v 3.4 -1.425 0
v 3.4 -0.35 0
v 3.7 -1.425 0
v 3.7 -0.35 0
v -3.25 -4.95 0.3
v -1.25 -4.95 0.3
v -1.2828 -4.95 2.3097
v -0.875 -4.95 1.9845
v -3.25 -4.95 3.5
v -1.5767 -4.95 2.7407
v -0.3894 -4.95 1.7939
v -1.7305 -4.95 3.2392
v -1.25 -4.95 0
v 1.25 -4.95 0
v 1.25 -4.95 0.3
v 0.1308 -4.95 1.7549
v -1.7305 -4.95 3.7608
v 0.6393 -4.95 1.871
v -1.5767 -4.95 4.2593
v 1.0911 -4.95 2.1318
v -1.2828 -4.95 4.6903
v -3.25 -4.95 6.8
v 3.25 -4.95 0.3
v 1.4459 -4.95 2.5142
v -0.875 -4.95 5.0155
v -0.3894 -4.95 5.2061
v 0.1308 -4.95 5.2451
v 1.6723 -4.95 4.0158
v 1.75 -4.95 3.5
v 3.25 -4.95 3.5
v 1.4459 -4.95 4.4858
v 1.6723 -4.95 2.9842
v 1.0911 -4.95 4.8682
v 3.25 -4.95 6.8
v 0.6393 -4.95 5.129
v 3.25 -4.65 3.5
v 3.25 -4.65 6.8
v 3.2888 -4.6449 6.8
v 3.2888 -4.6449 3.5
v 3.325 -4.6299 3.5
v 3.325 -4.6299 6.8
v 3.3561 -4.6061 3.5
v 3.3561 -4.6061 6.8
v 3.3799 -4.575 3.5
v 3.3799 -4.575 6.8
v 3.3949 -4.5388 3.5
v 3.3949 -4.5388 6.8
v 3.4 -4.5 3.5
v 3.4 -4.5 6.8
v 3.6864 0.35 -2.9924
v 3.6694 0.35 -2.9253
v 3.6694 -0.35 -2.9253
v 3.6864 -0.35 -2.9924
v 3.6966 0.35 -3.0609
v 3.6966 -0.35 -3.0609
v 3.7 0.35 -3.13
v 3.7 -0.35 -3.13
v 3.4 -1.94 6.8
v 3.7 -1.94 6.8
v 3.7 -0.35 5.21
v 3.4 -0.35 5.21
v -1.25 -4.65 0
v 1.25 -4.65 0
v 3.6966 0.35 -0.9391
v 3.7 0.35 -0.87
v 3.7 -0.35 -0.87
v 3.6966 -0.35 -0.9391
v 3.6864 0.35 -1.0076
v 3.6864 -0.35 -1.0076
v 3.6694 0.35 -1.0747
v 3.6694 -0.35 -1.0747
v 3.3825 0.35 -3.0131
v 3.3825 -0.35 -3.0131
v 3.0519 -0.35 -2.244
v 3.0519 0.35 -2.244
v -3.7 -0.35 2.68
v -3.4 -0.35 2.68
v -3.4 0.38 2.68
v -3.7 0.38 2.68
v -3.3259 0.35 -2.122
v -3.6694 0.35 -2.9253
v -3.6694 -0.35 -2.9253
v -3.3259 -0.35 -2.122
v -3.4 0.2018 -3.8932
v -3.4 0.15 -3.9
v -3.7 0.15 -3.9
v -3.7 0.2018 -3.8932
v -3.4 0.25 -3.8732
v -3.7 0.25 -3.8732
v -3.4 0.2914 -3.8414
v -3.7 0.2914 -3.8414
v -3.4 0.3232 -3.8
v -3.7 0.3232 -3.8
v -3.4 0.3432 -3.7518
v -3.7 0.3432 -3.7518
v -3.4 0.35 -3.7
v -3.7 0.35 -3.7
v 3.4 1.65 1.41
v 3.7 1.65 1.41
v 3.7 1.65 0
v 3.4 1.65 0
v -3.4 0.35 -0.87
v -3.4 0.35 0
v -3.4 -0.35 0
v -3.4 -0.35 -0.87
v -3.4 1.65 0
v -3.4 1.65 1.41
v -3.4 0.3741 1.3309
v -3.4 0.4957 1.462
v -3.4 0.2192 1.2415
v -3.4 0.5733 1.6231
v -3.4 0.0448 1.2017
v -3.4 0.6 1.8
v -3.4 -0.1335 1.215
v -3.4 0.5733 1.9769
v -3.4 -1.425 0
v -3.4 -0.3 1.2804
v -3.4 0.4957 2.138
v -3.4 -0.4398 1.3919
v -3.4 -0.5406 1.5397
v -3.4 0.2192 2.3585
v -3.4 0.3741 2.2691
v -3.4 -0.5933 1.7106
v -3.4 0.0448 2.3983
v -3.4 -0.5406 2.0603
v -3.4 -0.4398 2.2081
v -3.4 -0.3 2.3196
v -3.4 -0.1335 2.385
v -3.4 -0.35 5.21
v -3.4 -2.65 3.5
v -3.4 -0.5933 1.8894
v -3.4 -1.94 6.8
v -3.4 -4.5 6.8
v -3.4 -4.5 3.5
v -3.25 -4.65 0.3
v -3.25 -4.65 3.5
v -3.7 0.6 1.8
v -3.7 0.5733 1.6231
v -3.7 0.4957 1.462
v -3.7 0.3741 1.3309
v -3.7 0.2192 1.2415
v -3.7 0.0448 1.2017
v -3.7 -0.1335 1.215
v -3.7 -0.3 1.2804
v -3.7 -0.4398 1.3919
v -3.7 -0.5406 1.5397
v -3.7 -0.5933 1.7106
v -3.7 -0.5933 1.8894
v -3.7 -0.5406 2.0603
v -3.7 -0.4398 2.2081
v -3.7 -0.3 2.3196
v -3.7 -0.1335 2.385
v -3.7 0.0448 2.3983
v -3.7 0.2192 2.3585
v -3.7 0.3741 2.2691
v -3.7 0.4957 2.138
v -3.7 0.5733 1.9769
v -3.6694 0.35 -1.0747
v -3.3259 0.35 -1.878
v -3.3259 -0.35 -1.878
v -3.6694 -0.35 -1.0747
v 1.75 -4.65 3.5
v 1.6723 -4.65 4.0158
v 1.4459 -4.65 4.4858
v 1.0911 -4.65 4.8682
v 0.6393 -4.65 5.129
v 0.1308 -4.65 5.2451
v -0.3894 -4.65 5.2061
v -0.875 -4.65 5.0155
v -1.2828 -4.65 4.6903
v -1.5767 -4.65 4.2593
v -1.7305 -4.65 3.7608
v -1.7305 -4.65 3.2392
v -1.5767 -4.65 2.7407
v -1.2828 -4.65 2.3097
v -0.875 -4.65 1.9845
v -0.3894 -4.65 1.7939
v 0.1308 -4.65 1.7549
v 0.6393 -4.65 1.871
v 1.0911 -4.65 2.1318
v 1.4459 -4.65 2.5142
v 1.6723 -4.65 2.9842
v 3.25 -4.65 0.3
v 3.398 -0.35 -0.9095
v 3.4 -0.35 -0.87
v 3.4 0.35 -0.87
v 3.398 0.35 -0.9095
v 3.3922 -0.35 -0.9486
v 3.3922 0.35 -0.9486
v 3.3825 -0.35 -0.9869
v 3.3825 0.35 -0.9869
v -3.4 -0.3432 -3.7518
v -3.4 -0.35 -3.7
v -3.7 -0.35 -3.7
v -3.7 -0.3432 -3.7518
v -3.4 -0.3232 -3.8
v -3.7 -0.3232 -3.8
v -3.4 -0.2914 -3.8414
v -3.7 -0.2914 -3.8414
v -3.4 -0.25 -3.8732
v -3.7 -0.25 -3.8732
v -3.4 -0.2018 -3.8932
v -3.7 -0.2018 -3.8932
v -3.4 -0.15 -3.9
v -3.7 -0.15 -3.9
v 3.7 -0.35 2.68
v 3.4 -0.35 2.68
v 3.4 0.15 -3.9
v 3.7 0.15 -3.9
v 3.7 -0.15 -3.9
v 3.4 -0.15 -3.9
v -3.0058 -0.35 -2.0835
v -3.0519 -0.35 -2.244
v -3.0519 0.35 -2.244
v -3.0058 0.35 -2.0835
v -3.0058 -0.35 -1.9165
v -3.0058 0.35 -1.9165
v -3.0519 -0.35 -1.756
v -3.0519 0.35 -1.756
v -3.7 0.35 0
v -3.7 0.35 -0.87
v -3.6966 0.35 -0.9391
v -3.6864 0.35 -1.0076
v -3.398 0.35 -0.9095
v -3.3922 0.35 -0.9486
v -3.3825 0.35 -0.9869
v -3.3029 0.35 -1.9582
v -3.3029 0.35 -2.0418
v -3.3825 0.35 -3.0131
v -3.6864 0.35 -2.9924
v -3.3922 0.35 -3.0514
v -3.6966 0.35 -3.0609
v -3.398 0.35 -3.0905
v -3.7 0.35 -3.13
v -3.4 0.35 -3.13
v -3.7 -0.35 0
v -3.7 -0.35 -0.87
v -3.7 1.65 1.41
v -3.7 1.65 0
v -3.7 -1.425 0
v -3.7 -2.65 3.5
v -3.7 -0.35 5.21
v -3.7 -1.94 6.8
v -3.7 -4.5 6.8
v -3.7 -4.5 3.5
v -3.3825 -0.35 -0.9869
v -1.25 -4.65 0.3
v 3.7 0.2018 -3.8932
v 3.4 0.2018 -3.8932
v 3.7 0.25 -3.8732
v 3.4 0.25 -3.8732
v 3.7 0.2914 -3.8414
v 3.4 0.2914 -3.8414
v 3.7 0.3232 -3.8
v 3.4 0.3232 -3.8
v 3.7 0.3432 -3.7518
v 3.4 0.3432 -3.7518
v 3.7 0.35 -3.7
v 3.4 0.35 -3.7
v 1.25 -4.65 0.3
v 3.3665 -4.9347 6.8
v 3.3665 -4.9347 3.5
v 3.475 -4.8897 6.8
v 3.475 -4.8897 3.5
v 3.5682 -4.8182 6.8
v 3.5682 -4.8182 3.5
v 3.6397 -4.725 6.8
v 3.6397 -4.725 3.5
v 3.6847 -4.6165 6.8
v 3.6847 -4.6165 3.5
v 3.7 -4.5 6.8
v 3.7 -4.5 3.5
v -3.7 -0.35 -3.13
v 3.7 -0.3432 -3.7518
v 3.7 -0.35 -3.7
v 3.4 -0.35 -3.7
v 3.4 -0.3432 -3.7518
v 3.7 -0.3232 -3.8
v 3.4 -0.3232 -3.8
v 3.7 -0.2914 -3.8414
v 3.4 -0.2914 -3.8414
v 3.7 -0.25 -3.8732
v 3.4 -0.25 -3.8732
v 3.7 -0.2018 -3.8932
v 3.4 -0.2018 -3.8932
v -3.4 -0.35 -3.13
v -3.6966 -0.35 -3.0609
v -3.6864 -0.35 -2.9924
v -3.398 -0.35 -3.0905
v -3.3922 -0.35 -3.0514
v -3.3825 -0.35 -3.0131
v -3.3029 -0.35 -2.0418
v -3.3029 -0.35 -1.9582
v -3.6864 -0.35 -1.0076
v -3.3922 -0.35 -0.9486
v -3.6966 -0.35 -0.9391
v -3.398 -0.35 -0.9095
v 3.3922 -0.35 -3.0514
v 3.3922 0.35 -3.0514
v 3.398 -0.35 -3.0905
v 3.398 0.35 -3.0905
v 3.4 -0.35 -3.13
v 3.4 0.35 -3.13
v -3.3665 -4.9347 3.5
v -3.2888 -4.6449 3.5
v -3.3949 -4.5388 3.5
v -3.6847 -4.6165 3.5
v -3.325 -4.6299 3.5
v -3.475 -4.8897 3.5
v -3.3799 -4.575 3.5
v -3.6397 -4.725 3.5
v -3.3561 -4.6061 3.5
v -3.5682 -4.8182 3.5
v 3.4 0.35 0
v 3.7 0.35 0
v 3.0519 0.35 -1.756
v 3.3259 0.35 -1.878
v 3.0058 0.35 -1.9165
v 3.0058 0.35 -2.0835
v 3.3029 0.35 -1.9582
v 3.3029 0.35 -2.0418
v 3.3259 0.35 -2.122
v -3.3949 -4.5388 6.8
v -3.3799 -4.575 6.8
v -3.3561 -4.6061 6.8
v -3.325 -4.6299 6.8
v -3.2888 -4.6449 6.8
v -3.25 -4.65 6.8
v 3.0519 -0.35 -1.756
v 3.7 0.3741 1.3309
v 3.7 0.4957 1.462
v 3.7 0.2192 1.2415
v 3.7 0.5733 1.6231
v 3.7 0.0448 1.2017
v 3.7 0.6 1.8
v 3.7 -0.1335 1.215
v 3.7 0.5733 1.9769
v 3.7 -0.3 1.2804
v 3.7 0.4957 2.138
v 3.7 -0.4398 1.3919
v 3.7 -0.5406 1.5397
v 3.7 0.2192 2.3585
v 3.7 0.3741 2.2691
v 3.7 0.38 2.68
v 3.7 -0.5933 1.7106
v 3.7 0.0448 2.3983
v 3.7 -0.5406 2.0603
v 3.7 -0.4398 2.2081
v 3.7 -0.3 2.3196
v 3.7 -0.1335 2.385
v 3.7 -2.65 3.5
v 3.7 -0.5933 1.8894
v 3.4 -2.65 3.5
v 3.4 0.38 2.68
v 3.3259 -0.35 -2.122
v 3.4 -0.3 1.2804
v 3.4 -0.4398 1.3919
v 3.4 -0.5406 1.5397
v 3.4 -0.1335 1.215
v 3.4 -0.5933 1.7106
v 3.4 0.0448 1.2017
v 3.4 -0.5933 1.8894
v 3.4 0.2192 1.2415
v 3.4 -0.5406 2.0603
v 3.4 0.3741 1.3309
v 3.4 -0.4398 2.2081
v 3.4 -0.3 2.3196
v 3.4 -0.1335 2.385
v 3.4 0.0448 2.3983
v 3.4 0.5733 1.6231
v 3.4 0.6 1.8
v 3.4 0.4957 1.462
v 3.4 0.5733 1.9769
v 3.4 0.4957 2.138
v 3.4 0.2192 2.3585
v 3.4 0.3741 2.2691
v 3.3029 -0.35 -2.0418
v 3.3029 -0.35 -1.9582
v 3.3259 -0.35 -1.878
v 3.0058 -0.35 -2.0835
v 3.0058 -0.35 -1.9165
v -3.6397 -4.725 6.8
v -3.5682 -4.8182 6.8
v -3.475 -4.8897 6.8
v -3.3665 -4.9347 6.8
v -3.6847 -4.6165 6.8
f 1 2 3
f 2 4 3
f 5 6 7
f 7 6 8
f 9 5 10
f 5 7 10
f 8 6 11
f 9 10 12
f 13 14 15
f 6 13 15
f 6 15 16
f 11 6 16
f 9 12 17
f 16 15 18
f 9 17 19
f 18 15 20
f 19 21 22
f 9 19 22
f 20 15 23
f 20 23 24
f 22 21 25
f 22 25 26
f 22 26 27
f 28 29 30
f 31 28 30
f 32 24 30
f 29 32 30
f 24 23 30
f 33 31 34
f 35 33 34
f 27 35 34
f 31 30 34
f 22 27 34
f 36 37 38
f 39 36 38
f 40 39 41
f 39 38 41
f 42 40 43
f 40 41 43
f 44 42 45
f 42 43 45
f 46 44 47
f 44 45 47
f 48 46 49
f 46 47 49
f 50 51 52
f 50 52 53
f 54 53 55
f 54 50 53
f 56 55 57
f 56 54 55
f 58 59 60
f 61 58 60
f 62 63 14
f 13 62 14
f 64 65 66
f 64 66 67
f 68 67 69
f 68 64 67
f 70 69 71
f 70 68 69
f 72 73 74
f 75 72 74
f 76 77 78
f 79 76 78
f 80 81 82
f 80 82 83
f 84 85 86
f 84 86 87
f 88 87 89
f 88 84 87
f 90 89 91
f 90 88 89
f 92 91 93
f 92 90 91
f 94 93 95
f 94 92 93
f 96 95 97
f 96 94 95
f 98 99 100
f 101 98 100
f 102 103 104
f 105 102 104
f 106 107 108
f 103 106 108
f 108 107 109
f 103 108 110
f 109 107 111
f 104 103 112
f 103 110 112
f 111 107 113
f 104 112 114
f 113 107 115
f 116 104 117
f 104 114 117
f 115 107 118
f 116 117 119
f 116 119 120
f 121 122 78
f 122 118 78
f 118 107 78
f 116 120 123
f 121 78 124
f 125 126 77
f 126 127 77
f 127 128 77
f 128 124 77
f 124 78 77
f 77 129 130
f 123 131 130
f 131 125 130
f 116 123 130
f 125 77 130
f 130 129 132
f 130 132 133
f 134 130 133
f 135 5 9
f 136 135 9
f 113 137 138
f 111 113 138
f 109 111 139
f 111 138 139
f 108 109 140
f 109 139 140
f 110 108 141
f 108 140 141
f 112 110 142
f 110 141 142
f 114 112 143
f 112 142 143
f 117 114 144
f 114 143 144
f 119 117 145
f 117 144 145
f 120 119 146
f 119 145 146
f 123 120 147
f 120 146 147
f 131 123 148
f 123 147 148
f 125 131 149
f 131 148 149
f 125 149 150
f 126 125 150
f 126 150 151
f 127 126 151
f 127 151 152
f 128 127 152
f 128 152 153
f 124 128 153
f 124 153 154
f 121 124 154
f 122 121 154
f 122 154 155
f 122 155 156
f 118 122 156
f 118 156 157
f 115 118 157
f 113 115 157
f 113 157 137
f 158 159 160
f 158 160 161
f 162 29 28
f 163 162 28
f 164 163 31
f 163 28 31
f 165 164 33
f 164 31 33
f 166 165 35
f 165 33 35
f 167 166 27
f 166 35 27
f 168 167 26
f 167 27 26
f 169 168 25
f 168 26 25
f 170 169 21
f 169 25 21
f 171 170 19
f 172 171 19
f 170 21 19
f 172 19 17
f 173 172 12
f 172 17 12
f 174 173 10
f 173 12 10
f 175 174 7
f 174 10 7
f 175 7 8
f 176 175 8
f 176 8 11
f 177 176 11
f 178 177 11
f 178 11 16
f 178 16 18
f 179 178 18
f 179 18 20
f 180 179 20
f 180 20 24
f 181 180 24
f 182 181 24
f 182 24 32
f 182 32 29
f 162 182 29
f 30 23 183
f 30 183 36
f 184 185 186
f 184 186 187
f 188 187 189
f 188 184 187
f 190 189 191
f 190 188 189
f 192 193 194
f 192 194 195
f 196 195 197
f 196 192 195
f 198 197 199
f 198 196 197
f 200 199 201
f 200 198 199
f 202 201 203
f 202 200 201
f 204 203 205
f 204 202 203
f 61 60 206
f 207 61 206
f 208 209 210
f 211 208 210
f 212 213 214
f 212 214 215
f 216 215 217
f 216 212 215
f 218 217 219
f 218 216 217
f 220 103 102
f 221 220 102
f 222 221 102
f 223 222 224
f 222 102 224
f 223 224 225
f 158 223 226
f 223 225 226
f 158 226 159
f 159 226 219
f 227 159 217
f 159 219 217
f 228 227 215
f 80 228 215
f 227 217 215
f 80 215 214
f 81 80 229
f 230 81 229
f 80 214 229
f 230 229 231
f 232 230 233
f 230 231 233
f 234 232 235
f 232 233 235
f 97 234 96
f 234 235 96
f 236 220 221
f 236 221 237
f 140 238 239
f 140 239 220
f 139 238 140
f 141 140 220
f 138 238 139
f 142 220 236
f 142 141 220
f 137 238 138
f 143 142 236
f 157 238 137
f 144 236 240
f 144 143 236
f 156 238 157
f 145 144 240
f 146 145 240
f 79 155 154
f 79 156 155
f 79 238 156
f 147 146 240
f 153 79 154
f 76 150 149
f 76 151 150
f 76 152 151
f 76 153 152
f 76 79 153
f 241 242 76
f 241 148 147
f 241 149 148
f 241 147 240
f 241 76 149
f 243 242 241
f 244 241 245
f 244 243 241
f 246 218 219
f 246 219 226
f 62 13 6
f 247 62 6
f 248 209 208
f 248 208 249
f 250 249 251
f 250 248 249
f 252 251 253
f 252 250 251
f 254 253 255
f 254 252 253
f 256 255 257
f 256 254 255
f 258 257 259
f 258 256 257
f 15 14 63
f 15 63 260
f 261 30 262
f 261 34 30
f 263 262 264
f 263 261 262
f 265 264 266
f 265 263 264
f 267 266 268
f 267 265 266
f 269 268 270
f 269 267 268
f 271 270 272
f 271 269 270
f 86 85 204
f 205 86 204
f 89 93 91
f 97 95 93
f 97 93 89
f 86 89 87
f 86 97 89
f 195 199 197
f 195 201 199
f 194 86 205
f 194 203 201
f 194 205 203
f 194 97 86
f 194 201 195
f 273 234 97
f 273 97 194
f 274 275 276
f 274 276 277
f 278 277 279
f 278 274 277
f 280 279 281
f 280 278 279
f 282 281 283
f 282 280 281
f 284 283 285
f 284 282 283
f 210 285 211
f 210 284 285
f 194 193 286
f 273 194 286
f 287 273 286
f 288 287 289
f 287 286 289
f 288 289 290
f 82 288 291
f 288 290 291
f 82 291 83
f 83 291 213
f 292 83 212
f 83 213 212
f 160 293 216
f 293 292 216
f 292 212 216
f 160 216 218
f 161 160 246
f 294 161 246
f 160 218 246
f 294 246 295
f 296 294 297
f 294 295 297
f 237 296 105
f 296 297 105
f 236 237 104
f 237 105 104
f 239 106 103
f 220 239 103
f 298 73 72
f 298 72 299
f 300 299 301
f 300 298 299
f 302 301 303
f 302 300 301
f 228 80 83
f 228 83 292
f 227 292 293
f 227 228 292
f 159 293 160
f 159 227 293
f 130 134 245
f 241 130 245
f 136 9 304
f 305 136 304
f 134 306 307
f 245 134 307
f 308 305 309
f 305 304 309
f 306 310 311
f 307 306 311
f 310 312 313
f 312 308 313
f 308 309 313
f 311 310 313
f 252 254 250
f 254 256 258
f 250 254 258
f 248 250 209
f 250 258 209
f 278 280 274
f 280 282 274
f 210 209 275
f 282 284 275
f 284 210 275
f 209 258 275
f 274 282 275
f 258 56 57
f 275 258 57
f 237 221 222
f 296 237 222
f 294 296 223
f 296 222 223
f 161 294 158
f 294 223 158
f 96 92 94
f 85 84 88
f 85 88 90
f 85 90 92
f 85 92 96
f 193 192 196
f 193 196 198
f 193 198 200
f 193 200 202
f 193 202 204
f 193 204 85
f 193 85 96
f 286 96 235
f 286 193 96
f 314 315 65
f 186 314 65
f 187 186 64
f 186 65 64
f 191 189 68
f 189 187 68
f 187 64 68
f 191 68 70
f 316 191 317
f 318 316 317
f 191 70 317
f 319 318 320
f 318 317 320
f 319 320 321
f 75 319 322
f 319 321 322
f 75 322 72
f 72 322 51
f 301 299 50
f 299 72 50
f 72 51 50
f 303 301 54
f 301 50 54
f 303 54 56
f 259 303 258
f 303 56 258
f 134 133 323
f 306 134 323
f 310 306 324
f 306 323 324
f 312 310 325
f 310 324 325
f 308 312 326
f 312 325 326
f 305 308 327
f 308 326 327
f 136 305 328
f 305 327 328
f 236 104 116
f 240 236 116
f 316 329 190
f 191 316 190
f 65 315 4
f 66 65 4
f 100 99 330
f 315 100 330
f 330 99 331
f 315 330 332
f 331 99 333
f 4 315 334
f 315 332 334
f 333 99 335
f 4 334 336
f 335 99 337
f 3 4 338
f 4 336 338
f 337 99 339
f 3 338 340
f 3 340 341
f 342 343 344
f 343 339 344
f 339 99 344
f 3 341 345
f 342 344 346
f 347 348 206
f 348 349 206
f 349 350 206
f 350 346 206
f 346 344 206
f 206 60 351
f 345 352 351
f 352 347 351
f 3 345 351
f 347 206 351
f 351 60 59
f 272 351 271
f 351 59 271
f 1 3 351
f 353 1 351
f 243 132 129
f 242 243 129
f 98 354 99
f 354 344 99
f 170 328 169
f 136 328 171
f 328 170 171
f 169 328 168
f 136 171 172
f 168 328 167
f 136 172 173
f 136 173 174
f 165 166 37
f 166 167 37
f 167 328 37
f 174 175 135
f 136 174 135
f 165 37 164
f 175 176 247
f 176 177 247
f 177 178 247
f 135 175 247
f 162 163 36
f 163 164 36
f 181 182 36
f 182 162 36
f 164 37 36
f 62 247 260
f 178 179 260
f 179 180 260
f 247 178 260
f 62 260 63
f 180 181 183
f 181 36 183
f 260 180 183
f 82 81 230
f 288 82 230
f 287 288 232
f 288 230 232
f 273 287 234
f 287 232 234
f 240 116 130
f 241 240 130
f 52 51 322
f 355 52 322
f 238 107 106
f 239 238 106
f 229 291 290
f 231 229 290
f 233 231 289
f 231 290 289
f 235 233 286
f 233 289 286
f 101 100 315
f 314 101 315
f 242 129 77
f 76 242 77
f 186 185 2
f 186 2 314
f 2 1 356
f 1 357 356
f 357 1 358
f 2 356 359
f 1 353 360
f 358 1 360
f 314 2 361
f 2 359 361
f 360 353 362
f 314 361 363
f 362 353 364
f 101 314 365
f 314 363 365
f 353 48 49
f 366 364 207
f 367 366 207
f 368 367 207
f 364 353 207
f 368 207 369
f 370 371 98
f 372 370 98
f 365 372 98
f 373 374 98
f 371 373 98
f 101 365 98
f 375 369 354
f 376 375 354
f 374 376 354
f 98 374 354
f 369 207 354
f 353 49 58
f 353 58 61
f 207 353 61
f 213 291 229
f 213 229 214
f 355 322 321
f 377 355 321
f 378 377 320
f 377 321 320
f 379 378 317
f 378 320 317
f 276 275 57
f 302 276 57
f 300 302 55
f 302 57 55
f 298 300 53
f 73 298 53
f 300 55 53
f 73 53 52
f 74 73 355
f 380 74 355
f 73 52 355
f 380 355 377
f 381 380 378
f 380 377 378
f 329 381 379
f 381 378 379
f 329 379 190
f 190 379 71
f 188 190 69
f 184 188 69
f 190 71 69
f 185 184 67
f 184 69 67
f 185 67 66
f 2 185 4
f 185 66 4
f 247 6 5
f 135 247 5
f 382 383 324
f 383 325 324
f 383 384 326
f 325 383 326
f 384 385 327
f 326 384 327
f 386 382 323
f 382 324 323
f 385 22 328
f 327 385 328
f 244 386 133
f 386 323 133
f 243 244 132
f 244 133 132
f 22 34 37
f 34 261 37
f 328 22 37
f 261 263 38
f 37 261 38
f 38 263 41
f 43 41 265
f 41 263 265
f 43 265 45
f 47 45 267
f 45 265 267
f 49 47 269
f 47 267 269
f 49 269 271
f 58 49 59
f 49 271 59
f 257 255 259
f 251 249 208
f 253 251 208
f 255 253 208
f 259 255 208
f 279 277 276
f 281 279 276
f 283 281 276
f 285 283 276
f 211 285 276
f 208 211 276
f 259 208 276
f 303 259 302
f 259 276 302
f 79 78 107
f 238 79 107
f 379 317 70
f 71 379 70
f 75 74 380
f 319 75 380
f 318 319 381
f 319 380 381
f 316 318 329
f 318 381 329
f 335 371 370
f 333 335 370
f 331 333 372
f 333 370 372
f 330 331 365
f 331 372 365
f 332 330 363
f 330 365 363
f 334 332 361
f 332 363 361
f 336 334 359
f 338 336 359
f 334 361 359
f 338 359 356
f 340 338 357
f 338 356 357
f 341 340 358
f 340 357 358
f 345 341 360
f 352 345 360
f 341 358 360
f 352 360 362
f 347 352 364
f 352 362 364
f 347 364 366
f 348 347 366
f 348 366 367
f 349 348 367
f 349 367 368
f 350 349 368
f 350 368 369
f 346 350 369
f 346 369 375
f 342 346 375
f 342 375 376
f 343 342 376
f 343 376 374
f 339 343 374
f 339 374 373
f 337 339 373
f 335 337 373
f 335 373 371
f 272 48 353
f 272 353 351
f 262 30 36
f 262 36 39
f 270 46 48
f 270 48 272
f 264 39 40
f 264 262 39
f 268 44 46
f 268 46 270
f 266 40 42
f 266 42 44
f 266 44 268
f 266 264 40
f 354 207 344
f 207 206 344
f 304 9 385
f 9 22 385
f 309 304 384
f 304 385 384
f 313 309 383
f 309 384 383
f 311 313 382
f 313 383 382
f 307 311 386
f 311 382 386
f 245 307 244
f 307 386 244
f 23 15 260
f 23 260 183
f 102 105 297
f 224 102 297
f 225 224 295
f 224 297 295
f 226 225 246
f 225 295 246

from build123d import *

# Parameters (mm, degrees)
PAD_DEPTH       = 3.7
POCKET_DEPTH    = 10.701
POCKET001_DEPTH = 1
POCKET002_DEPTH = 1
SKETCH004_R     = 0.6
POCKET003_DEPTH = 7.401
FILLET_R        = 0.45
SKETCH005_R     = 1.75
POCKET004_DEPTH = 6.601


with BuildPart() as part:
    # Sketch → Pad (new body, symmetric)
    with BuildSketch(Plane.YZ):
        with BuildLine():
            Line((-4.95, 0), (-4.95, 6.8))
            Line((-4.95, 6.8), (-1.94, 6.8))
            Line((-1.94, 6.8), (-0.35, 5.21))
            Line((-0.35, 5.21), (-0.35, 2.68))
            Line((-0.35, 2.68), (0.38, 2.68))
            Line((0.38, 2.68), (1.65, 1.41))
            Line((1.65, 1.41), (1.65, 0))
            Line((1.65, 0), (0.35, 0))
            Line((0.35, 0), (0.35, -3.7))
            ThreePointArc((0.15, -3.9), (0.291421, -3.841421), (0.35, -3.7))
            Line((0.15, -3.9), (-0.15, -3.9))
            ThreePointArc((-0.35, -3.7), (-0.291421, -3.841421), (-0.15, -3.9))
            Line((-0.35, -3.7), (-0.35, 0))
            Line((-0.35, 0), (-1.425, 0))
            Line((-1.425, 0), (-2.65, 3.5))
            Line((-2.65, 3.5), (-4.65, 3.5))
            Line((-4.65, 3.5), (-4.65, 0))
            Line((-4.65, 0), (-4.95, 0))
        make_face()
    extrude(amount=PAD_DEPTH, both=True)

    # Sketch001 (on Face8 of Pad) → Pocket (cut, through all)
    with BuildSketch(Plane(origin=(0, 0, 6.8), x_dir=(0, -1, 0), z_dir=(0, 0, 1))):
        with BuildLine():
            Line((-2.38, -3.4), (-0.35, -3.4))
            Line((-0.35, -3.4), (-0.35, -3))
            Line((-0.35, -3), (0.35, -3))
            Line((0.35, -3), (0.35, -3.4))
            Line((0.35, -3.4), (4.5, -3.4))
            ThreePointArc((4.5, -3.4), (4.606066, -3.356066), (4.65, -3.25))
            Line((4.65, -3.25), (4.65, 3.25))
            ThreePointArc((4.65, 3.25), (4.606066, 3.356066), (4.5, 3.4))
            Line((4.5, 3.4), (0.35, 3.4))
            Line((0.35, 3.4), (0.35, 3))
            Line((0.35, 3), (-0.38, 3))
            Line((-0.38, 3), (-0.38, 3.4))
            Line((-0.38, 3.4), (-2.38, 3.4))
            Line((-2.38, 3.4), (-2.38, -3.4))
        make_face()
    extrude(amount=-POCKET_DEPTH, mode=Mode.SUBTRACT)

    # Sketch002 (on Face33 of Pocket) → Pocket001 (cut, symmetric)
    with BuildSketch(Plane.ZX.offset(0.35)):
        with BuildLine():
            Line((-4.2, 3.4), (-3.13, 3.4))
            ThreePointArc((-3.013051, 3.382522), (-3.070876, 3.395606), (-3.13, 3.4))
            Line((-3.013051, 3.382522), (-2.244042, 3.051873))
            ThreePointArc((-2.244042, 3.051873), (-2, 3), (-1.755958, 3.051873))
            Line((-1.755958, 3.051873), (-0.986949, 3.382522))
            ThreePointArc((-0.87, 3.4), (-0.929124, 3.395606), (-0.986949, 3.382522))
            Line((-0.87, 3.4), (2.68, 3.4))
            Line((2.68, 3.4), (2.98, 3.4))
            Line((2.98, 3.4), (2.98, 2.7))
            Line((2.98, 2.7), (-4.2, 2.7))
            Line((-4.2, 2.7), (-4.2, 3))
            Line((-4.2, 3), (-4.2, 3.4))
        make_face()
        with BuildLine():
            ThreePointArc((-2.92534, 3.669413), (-3.026533, 3.692311), (-3.13, 3.7))
            Line((-3.13, 3.7), (-3.13, 3.9))
            Line((-3.13, 3.9), (-0.87, 3.9))
            Line((-0.87, 3.9), (-0.87, 3.7))
            ThreePointArc((-0.87, 3.7), (-0.973467, 3.692311), (-1.07466, 3.669413))
            Line((-1.877979, 3.325936), (-1.07466, 3.669413))
            ThreePointArc((-2.122021, 3.325936), (-2, 3.3), (-1.877979, 3.325936))
            Line((-2.92534, 3.669413), (-2.122021, 3.325936))
        make_face()
    pocket001 = extrude(amount=POCKET001_DEPTH, both=True, mode=Mode.SUBTRACT)

    # Mirrored: Pocket001 across Sketch002 H_Axis
    add(pocket001.mirror(Plane(origin=(0, 0.35, 0), x_dir=(0, 1, 0), z_dir=(1, 0, 0))), mode=Mode.SUBTRACT)

    # Sketch003 (on Face26 of Mirrored) → Pocket002 (cut)
    with BuildSketch(Plane(origin=(0, -4.95, 0), x_dir=(0, 0, -1), z_dir=(0, -1, 0))):
        Polygon((0, -1.25), (-0.3, -1.25), (-0.3, -3.25), (-3.5, -3.25), (-3.5, -3.7), (-3.5, -4.2), (0.5, -4.2), (0.5, -1.25), align=None)
    pocket002 = extrude(amount=-POCKET002_DEPTH, mode=Mode.SUBTRACT)

    # Mirrored001: Pocket002 across Sketch003 H_Axis
    add(pocket002.mirror(Plane(origin=(0, -4.95, 0), x_dir=(0, -1, 0), z_dir=(1, 0, 0))), mode=Mode.SUBTRACT)

    # Sketch004 (on Face9 of Mirrored001) → Pocket003 (cut, through all)
    with BuildSketch(Plane(origin=(-3.7, 0, 0), x_dir=(0, 1, 0), z_dir=(-1, 0, 0))):
        with Locations((0, -1.8)):
            Circle(SKETCH004_R)
    extrude(amount=-POCKET003_DEPTH, mode=Mode.SUBTRACT)

    # Fillet
    fillet_edges = [part.edges().sort_by_distance(p)[0] for p in [
        (-3.7, -4.95, 5.15),
        (3.7, -4.95, 5.15),
    ]]
    fillet(fillet_edges, radius=FILLET_R)

    # Sketch005 (on Face20 of Fillet) → Pocket004 (cut, through all)
    with BuildSketch(Plane.XZ.offset(4.95)):
        with Locations((0, 3.5)):
            Circle(SKETCH005_R)
    extrude(amount=-POCKET004_DEPTH, mode=Mode.SUBTRACT)


solid = part.part
